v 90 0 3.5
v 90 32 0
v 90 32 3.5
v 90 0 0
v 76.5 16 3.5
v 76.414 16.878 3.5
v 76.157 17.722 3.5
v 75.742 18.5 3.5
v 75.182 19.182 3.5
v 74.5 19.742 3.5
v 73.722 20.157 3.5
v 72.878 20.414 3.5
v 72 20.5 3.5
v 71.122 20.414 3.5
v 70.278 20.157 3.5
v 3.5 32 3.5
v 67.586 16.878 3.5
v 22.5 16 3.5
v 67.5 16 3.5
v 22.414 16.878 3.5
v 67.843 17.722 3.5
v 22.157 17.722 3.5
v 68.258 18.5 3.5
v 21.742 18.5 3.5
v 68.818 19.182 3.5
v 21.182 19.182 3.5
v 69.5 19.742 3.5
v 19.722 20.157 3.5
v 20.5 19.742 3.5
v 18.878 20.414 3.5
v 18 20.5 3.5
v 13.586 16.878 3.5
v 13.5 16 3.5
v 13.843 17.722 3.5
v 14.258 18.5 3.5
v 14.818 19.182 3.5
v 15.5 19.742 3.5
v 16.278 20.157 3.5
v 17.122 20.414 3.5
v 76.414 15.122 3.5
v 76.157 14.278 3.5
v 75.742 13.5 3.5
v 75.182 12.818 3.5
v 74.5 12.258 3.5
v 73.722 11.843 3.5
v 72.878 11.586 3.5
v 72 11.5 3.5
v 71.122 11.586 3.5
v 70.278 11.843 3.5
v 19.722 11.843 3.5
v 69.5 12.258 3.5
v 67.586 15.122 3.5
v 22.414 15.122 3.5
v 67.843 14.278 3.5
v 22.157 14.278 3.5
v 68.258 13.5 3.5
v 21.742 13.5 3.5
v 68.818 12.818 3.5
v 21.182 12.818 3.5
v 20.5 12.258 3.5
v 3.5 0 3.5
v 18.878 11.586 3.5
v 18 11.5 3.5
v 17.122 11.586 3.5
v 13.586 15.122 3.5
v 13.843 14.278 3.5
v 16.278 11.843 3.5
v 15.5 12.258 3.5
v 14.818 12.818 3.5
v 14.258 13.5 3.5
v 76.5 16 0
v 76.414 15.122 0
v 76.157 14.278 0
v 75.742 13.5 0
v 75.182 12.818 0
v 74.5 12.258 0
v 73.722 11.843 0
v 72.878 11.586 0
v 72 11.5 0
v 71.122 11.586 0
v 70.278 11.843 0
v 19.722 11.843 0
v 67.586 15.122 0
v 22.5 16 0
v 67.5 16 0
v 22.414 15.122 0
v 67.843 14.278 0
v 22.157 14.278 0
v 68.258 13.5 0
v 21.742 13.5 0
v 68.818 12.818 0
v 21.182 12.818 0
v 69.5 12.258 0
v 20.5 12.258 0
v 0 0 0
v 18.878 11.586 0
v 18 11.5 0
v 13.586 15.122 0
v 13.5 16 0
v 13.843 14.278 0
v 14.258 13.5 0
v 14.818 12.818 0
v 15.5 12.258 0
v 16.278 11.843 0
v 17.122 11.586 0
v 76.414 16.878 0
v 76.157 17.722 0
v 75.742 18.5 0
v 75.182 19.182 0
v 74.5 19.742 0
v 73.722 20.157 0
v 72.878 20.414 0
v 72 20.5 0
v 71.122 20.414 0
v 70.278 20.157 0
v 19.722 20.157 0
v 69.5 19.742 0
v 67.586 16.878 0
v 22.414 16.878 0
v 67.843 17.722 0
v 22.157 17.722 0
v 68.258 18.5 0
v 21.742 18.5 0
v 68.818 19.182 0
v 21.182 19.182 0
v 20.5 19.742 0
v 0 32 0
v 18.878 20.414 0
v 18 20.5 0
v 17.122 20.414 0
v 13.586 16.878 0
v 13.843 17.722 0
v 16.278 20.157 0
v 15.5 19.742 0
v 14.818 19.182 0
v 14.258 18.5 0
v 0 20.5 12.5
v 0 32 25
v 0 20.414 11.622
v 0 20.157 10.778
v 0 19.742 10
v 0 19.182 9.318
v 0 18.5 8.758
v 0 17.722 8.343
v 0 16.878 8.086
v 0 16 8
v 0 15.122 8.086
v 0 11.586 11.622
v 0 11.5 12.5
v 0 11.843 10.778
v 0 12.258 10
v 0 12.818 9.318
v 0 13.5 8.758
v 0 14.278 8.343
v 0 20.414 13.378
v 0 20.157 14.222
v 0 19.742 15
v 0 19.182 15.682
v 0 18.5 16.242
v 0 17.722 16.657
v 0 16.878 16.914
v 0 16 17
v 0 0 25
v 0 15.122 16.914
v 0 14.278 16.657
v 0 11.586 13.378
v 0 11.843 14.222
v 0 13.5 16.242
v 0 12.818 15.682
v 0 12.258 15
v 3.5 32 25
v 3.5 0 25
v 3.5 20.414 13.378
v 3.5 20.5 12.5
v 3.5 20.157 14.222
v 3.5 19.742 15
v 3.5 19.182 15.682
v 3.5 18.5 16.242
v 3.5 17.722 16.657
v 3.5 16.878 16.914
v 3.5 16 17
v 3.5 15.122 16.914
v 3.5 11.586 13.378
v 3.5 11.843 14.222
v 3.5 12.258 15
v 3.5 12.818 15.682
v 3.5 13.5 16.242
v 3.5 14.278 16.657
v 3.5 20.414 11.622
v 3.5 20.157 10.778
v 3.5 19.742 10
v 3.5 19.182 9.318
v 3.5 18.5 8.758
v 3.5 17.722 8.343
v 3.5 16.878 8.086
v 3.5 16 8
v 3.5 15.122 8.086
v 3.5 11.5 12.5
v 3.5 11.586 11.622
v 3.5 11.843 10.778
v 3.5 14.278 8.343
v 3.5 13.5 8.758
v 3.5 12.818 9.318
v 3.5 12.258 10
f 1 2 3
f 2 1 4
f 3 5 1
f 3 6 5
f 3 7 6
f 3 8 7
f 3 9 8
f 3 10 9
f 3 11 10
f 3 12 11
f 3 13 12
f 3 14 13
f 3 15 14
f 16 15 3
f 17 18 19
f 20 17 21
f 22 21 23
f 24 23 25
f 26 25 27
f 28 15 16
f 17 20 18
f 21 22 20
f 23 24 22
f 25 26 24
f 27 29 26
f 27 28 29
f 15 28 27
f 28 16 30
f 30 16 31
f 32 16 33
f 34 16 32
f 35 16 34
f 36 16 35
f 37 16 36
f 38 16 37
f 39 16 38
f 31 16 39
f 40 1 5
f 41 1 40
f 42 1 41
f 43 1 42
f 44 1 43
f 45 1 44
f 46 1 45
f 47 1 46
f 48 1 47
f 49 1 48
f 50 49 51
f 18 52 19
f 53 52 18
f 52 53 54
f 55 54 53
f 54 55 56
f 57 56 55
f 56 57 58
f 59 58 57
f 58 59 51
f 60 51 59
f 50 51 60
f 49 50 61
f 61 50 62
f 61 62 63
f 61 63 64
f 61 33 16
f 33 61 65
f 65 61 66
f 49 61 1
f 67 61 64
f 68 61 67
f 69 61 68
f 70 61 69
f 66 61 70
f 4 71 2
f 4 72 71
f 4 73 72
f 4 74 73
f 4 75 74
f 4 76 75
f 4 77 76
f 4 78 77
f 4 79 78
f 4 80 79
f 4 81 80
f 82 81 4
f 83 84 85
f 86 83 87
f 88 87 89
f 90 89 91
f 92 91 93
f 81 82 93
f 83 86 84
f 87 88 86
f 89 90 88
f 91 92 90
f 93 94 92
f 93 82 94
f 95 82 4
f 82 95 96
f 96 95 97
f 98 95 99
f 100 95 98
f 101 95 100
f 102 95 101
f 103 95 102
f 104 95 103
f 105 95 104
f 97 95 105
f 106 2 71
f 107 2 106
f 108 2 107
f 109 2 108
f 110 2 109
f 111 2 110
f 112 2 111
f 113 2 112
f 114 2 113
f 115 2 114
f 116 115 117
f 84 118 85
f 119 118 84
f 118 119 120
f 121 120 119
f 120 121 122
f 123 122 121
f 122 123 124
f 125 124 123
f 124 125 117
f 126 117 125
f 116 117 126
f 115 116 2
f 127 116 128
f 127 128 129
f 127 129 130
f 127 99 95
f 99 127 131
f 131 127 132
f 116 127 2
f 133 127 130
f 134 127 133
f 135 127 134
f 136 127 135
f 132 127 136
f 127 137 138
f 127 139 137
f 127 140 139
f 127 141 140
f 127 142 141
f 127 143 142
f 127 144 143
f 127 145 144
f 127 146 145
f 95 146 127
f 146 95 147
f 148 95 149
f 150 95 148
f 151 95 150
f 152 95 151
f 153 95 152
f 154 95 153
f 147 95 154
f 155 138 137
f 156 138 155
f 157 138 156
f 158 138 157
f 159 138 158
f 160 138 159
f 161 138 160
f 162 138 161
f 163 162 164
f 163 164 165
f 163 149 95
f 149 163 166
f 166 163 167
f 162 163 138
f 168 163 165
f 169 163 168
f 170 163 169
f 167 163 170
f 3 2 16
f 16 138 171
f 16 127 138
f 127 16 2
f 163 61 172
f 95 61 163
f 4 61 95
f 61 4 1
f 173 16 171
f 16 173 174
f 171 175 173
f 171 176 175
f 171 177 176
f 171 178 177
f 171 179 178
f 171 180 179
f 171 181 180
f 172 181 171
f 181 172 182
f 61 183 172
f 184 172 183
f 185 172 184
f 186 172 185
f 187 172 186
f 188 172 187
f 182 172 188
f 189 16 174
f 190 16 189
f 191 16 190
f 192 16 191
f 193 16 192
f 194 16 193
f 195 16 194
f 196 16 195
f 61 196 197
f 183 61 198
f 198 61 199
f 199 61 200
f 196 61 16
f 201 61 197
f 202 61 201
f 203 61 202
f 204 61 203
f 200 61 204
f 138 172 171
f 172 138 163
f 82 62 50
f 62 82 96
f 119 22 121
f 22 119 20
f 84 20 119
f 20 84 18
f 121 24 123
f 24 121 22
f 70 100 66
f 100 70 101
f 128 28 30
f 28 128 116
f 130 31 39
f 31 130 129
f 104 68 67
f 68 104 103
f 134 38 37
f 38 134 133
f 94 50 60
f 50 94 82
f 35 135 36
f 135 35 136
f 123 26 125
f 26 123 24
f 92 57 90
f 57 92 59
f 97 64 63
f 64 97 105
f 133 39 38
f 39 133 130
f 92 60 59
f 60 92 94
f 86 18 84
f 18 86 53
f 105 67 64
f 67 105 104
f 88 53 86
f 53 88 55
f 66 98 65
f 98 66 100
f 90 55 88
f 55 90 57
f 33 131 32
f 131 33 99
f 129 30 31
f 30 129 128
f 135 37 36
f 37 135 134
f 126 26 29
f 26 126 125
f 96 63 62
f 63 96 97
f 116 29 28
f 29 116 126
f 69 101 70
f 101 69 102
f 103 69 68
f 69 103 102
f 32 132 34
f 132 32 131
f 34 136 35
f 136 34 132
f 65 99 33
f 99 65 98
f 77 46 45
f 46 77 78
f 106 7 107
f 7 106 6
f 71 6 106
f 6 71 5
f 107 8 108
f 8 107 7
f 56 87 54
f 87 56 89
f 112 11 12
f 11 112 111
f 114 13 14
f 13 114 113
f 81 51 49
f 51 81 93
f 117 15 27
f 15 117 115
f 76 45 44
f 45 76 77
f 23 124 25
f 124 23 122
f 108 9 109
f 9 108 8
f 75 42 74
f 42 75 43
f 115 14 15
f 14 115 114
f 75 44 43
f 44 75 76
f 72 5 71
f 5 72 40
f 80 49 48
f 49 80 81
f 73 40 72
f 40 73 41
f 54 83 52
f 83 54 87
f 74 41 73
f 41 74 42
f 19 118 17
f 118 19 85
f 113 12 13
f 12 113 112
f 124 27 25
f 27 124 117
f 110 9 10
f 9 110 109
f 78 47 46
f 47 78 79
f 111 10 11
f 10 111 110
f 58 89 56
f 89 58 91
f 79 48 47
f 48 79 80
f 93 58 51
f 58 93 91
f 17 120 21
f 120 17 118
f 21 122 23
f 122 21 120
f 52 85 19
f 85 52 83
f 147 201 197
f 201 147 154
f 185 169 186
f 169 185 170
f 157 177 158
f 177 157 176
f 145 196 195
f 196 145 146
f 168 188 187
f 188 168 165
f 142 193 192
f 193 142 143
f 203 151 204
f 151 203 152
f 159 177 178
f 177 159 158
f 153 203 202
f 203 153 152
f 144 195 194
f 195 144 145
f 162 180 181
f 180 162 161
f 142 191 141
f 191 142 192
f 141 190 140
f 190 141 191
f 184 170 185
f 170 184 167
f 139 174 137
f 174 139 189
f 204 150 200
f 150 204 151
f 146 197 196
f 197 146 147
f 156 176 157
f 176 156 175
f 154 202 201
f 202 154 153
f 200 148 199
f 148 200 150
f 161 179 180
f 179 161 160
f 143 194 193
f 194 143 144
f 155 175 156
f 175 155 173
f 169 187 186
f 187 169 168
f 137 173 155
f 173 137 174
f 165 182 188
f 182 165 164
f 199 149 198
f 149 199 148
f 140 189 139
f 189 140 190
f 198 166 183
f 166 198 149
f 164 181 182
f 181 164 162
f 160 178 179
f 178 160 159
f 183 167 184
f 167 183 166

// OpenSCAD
$fn = 32;

// ----------------------------------------------------------------------
// L-bracket: 90 x 32 x 25 mm
// ----------------------------------------------------------------------

// --- parameters (mm) ---
leg_a = 90;               // horizontal leg, X
leg_b = 25;               // vertical leg, Z
depth = 32;               // bracket depth, Y
thick = 3.5;              // plate thickness
hole_d = 9;               // clearance for M8

module hole_z(px, py) {
  translate([px, py, -0.5]) cylinder(h = thick + 1, d = hole_d);
}
module hole_x(pz, py) {
  translate([-0.5, py, pz]) rotate([0, 90, 0]) cylinder(h = thick + 1, d = hole_d);
}

difference() {
  union() {
    /* horizontal leg */
    cube([leg_a, depth, thick]);
    /* vertical leg, overlapping the corner block */
    cube([thick, depth, leg_b]);
  }
  hole_z(18, 16);
  hole_z(72, 16);
  hole_x(12.5, 16);
}
